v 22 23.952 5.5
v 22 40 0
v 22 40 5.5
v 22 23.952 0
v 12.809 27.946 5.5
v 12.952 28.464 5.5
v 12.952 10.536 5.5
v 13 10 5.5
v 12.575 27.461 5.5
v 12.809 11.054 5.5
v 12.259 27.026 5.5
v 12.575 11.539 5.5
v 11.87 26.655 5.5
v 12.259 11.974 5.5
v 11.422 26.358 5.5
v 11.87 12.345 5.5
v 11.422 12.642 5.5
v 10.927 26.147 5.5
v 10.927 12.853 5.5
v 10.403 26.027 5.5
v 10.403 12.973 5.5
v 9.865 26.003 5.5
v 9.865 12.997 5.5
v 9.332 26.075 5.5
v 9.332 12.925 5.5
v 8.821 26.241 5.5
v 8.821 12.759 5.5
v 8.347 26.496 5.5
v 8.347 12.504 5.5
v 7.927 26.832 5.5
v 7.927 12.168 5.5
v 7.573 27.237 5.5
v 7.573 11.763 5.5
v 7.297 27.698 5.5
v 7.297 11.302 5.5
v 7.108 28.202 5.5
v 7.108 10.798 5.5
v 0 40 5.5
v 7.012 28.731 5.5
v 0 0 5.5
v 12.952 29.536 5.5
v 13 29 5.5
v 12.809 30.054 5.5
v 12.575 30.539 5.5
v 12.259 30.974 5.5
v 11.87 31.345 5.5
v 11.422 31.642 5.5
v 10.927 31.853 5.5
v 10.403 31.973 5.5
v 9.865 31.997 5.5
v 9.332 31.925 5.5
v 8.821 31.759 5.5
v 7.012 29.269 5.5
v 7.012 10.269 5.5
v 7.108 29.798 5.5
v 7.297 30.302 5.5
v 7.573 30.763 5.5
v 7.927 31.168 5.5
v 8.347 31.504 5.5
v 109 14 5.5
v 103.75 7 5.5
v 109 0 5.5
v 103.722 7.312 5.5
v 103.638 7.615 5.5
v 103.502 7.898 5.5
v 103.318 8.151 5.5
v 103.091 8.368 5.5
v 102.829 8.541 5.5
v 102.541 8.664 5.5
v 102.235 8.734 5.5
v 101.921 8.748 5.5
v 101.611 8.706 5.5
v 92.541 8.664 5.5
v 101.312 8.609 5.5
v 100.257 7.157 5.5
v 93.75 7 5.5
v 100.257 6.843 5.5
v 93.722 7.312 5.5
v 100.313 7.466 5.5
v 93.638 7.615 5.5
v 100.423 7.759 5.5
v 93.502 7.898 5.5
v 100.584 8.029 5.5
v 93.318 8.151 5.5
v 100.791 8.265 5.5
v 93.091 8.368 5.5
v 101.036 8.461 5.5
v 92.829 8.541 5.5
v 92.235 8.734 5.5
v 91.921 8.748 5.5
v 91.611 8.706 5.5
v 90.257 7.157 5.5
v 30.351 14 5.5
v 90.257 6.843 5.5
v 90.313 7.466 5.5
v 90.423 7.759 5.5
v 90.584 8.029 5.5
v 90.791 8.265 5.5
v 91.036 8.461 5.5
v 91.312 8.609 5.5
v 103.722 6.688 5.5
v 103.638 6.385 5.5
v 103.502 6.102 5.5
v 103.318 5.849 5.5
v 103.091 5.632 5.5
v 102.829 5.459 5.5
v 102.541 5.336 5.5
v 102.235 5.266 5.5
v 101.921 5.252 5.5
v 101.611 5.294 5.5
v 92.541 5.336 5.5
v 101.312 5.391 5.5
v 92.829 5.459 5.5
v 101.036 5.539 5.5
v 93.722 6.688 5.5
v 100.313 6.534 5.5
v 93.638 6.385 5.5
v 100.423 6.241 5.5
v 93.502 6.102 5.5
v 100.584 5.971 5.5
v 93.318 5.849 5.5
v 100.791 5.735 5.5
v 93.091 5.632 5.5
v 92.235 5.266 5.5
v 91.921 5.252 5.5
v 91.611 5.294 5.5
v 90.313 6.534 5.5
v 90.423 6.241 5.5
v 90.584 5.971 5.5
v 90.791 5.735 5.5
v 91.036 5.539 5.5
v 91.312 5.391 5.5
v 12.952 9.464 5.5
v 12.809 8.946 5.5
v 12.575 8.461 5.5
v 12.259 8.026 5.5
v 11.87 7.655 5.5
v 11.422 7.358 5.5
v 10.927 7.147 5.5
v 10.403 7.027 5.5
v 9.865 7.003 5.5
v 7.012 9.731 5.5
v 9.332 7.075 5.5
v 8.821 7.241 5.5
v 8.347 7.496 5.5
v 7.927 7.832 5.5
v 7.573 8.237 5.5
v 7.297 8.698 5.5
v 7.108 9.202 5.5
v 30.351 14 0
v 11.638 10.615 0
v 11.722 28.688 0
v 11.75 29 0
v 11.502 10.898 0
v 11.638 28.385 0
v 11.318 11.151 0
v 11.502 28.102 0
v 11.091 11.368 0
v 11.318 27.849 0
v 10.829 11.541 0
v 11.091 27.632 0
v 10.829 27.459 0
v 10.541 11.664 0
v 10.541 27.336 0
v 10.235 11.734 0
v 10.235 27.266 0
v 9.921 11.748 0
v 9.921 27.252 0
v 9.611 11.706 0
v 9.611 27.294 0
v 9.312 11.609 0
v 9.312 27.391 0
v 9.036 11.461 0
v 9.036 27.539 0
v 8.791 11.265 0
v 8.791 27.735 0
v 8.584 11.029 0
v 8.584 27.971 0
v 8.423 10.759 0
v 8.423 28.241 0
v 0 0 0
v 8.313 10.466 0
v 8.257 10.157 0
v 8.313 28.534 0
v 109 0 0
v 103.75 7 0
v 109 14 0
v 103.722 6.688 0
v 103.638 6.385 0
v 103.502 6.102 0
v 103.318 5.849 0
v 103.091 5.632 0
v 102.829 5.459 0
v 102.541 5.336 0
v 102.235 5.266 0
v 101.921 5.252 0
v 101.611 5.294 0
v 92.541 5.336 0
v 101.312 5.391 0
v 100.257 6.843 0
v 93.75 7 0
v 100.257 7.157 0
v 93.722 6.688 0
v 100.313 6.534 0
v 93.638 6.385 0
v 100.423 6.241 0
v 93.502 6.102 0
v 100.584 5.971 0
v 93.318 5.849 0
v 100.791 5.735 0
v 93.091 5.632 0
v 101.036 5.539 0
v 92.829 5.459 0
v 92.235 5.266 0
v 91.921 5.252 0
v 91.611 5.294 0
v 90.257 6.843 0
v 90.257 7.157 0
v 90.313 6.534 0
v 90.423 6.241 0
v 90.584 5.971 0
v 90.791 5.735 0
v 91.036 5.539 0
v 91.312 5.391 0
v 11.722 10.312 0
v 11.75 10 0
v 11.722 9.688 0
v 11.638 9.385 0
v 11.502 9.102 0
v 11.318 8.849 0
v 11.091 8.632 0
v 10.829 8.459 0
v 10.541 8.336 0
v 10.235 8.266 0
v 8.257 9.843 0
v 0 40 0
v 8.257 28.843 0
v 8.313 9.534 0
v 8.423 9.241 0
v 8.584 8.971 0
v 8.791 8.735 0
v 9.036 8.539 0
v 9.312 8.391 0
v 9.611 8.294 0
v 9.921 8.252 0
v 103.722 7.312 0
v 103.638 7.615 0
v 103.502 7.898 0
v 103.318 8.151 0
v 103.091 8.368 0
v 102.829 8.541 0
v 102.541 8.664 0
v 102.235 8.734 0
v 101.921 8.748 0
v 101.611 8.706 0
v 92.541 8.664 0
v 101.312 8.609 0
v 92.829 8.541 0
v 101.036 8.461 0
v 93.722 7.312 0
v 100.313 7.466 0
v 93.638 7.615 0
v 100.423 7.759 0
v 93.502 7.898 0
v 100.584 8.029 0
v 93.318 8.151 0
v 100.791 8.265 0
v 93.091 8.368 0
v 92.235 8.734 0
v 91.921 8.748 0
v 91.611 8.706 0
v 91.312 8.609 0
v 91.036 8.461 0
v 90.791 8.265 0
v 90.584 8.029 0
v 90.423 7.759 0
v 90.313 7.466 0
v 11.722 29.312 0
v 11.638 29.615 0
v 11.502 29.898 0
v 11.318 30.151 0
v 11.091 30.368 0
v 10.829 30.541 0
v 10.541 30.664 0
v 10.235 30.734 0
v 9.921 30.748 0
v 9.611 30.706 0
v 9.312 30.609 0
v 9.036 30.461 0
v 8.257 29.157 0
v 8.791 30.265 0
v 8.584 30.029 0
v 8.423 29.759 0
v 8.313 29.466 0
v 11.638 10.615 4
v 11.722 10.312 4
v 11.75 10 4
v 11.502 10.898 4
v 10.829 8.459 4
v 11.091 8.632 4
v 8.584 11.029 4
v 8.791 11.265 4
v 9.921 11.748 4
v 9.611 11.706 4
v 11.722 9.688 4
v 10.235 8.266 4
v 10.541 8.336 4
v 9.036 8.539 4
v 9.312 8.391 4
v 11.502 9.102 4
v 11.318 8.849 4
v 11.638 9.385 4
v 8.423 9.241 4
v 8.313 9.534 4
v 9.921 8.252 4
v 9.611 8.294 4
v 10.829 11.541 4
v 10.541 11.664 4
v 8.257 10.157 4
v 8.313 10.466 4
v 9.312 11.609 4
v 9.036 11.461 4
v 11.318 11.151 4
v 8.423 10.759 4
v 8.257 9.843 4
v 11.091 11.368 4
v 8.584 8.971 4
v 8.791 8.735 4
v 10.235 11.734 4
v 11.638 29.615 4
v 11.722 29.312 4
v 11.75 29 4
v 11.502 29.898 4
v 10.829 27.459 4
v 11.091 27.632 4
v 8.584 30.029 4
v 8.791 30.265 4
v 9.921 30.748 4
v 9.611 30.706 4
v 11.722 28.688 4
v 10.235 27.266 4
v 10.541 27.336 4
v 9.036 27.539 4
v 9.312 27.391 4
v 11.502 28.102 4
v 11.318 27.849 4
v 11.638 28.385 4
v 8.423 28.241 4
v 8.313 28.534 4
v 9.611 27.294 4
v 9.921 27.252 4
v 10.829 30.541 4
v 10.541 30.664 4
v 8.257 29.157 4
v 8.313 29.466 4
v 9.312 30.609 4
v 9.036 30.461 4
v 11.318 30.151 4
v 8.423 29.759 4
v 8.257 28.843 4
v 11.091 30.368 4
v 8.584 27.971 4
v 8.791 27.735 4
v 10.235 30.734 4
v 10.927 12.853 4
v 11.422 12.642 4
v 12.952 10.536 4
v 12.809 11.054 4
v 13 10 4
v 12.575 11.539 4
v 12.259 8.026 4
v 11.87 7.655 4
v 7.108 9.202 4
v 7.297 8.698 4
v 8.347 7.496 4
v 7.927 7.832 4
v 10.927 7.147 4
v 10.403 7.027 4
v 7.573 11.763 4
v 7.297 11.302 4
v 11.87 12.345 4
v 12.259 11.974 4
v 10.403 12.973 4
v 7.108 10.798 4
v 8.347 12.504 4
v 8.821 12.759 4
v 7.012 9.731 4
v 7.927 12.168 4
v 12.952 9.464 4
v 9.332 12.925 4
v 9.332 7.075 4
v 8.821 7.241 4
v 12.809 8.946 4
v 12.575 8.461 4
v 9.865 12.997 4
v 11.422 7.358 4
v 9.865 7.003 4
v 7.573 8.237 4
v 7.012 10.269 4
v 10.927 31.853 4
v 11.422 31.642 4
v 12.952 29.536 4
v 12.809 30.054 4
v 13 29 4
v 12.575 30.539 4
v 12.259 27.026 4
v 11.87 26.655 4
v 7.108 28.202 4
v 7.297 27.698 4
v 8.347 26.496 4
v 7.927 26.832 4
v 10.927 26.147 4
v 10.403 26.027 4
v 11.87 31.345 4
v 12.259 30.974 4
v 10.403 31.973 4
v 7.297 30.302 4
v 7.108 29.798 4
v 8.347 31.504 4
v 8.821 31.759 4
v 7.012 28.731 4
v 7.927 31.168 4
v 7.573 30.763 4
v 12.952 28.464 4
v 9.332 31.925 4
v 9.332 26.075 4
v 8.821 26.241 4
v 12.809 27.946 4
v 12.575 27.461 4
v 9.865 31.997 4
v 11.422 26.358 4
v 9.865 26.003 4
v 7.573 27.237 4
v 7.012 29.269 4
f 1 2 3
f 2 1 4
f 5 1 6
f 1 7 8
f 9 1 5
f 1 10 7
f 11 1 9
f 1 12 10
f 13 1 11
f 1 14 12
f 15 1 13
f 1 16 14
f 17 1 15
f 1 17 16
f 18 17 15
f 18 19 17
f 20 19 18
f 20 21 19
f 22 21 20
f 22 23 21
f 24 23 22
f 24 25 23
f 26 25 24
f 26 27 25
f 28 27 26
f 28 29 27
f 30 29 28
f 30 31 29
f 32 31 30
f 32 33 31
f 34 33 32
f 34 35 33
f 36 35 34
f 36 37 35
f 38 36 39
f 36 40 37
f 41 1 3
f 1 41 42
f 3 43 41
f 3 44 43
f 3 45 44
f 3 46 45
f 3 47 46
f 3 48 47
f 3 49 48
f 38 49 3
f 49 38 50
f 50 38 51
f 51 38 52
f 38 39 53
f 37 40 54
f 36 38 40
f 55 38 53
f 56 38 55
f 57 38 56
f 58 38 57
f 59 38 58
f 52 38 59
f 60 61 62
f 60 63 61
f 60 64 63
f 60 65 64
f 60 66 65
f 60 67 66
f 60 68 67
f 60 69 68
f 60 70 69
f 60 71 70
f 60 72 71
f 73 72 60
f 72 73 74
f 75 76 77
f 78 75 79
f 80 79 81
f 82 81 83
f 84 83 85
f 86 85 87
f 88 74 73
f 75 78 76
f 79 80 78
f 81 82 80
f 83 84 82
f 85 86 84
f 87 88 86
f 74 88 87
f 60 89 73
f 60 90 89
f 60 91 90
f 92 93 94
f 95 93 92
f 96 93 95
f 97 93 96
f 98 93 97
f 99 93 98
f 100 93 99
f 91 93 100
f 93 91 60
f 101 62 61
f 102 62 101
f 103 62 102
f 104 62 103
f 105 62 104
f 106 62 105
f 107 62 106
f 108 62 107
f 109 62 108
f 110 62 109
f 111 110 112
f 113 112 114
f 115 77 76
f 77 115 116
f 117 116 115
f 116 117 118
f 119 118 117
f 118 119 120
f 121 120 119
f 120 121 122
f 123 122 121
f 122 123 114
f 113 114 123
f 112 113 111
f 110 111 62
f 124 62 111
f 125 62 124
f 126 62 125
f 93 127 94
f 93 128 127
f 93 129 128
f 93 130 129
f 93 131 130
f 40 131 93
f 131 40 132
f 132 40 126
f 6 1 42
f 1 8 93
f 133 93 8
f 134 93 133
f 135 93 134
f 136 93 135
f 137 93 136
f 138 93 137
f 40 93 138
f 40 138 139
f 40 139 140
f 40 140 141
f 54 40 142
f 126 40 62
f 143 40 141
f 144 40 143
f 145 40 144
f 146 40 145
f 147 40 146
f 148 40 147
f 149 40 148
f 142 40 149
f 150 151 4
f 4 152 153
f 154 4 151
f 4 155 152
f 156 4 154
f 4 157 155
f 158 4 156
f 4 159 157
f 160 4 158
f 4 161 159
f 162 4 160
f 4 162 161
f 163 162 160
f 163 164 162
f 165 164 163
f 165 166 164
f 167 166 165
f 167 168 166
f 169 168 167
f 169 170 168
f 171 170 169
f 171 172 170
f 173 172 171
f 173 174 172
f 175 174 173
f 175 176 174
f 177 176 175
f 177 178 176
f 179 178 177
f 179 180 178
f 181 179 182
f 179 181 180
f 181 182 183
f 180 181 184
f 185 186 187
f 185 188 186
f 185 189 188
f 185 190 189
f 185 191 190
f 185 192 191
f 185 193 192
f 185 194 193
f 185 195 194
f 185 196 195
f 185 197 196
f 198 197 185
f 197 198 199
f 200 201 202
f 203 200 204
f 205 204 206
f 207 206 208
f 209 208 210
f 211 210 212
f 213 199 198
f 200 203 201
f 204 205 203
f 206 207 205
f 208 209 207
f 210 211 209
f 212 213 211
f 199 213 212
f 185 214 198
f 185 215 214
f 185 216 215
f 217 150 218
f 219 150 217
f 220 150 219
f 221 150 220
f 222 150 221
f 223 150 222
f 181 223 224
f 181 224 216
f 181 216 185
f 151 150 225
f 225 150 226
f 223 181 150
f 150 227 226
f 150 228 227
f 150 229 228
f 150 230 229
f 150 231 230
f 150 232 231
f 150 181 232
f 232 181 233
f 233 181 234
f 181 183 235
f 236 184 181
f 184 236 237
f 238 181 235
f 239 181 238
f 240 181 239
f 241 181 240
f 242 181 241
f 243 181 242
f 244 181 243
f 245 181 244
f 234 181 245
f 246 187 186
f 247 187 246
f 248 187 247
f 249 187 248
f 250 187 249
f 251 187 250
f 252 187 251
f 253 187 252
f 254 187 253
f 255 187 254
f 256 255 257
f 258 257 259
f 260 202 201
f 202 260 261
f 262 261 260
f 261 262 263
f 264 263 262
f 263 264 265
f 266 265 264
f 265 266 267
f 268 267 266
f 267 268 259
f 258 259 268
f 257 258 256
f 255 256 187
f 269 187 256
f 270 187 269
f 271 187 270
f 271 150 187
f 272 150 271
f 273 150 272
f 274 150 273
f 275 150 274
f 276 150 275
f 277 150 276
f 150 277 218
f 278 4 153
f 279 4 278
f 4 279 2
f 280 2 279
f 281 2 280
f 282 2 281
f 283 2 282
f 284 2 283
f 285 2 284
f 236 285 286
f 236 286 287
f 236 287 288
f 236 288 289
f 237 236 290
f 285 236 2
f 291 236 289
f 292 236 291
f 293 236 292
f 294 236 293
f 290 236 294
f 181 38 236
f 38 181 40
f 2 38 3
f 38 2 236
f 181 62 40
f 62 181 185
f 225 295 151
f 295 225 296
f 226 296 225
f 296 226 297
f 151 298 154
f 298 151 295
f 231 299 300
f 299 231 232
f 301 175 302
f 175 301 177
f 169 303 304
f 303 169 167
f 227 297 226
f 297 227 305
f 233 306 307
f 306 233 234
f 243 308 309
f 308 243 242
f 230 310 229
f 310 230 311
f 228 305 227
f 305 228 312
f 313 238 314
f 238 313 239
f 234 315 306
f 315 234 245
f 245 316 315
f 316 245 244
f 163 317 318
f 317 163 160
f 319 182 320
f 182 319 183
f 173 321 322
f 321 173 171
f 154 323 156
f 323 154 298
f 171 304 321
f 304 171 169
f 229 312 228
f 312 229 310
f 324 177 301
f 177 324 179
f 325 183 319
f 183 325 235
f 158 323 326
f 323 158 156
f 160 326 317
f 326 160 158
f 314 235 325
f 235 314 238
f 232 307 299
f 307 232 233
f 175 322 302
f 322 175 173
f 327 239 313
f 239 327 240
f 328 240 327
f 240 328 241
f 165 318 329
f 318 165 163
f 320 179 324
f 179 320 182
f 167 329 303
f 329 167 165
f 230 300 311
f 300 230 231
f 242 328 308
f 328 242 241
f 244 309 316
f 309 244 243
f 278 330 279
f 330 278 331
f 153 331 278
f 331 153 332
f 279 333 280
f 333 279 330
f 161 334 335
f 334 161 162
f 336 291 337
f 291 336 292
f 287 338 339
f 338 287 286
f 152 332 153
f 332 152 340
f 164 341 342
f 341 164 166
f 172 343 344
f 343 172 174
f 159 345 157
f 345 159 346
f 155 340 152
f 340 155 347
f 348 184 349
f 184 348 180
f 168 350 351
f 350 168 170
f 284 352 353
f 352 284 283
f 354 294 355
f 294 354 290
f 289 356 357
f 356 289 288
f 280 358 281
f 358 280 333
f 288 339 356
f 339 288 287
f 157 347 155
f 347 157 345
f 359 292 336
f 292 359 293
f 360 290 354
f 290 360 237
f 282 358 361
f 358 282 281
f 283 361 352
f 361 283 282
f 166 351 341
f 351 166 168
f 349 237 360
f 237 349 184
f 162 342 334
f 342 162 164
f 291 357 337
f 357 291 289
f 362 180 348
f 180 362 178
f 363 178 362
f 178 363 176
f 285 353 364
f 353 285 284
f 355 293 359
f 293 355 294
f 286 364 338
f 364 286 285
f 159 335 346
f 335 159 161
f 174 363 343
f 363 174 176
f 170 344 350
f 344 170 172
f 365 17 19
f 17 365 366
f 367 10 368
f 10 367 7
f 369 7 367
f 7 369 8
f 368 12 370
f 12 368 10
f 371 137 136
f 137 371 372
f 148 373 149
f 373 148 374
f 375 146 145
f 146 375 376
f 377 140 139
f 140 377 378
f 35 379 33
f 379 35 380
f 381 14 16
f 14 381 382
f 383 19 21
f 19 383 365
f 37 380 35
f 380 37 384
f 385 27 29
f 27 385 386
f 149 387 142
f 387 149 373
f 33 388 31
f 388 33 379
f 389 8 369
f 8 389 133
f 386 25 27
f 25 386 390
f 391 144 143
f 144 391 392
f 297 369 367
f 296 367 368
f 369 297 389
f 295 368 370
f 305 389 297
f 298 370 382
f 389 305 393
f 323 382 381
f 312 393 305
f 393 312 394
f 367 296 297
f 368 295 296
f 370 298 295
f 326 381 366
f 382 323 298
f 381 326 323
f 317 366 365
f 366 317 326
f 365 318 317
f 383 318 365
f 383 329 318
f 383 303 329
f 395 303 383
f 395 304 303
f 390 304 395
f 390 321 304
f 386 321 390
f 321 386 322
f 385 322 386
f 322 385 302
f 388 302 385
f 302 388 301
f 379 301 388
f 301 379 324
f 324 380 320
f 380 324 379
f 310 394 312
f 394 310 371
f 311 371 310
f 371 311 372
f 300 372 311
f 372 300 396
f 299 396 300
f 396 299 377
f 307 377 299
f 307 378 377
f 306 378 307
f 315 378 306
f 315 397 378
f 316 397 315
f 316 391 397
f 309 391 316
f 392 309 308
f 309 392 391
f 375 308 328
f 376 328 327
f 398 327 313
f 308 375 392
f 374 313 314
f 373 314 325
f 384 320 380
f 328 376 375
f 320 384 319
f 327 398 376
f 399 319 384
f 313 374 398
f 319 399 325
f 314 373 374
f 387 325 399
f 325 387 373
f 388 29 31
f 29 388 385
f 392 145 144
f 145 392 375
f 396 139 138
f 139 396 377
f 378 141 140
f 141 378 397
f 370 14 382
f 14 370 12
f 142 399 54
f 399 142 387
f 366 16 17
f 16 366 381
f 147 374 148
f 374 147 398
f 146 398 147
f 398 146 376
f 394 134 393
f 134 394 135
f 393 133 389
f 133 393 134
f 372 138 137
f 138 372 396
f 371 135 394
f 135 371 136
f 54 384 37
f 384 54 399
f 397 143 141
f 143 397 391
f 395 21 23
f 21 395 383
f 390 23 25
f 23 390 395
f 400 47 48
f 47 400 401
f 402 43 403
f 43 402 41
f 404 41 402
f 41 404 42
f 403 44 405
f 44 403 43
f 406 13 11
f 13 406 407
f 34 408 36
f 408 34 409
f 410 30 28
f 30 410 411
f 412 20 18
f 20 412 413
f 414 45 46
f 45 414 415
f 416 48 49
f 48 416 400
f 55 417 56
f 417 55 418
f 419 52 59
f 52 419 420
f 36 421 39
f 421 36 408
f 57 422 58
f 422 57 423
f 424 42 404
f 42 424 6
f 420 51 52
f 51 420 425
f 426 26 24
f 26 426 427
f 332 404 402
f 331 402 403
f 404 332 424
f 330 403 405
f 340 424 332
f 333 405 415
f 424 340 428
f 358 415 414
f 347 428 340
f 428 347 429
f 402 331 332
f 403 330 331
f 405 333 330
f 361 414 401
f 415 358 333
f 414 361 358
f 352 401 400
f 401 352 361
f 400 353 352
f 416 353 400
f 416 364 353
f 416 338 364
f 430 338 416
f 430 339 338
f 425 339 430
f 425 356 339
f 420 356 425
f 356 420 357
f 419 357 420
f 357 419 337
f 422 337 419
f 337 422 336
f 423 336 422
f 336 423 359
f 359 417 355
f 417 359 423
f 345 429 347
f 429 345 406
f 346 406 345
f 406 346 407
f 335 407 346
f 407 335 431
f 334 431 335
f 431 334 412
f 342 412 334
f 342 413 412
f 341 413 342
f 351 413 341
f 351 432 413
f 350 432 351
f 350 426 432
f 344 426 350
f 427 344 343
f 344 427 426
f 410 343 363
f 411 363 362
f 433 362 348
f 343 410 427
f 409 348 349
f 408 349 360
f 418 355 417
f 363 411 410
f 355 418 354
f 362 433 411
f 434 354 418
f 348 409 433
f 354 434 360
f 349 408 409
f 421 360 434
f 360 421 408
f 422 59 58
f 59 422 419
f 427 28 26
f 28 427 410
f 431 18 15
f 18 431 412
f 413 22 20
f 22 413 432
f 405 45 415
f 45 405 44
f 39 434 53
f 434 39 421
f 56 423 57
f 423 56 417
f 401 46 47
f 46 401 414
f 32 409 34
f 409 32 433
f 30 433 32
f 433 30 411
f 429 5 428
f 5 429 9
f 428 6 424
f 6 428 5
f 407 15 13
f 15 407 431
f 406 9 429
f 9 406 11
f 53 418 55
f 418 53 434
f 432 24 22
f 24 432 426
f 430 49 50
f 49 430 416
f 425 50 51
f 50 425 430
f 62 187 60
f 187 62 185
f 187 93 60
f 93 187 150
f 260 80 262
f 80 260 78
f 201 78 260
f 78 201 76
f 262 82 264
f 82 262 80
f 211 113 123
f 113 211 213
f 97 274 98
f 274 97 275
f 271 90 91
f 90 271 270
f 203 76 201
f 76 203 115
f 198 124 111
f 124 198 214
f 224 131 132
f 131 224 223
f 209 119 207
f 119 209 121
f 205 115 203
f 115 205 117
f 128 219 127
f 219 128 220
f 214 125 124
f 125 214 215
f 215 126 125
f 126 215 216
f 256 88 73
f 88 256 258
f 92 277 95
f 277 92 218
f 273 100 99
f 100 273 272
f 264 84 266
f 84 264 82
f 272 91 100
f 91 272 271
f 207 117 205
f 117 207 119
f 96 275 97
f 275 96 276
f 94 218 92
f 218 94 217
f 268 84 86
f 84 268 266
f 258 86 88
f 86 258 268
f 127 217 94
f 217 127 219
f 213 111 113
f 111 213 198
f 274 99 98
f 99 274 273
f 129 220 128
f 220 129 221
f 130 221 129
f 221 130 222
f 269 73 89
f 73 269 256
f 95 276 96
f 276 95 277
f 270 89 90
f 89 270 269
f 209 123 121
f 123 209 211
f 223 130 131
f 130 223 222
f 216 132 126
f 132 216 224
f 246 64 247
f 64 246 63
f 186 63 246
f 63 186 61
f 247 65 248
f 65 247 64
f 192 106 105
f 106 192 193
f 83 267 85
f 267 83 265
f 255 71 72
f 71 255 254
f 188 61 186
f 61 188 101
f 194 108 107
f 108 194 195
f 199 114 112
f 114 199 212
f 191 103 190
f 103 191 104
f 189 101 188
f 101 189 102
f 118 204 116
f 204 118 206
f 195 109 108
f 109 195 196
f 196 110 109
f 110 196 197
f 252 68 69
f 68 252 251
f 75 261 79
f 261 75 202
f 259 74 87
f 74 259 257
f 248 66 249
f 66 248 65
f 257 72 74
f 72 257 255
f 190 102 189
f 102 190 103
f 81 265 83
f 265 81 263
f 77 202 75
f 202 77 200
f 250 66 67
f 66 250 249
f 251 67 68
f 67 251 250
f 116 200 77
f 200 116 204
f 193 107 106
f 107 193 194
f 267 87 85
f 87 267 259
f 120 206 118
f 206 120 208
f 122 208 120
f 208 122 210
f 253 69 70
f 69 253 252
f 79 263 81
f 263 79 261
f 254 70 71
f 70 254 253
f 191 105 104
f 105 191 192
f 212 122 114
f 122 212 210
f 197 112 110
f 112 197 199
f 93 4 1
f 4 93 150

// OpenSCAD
//spool holder that attaches to the side of a kossel 2020 with m3 t nuts

$fn = 35;

//frame attachment piece
difference(){
    cube([22,40,5.5]);

    //screw holes
    translate([10,10,-1])
        cylinder(20,d=3.5);  
    translate([10,29,-1])
        cylinder(20,d=3.5);
    
    //screw head indent
    translate([10,10,4])
        cylinder(20,d=6);  
    translate([10,29,4])
        cylinder(20,d=6);
    }
    
//main spool holding arm
translate([22,0,0])
    difference(){
        cube([87,14,5.5]);

        translate([70,7,-1])
            cylinder(20,d=3.5);
        
        translate([80,7,-1])
            cylinder(20,d=3.5);
        }
        
//support for extrusion attachment and main arm
translate([20,3,0])
rotate(40)
        cube([15,15,5.5]);
